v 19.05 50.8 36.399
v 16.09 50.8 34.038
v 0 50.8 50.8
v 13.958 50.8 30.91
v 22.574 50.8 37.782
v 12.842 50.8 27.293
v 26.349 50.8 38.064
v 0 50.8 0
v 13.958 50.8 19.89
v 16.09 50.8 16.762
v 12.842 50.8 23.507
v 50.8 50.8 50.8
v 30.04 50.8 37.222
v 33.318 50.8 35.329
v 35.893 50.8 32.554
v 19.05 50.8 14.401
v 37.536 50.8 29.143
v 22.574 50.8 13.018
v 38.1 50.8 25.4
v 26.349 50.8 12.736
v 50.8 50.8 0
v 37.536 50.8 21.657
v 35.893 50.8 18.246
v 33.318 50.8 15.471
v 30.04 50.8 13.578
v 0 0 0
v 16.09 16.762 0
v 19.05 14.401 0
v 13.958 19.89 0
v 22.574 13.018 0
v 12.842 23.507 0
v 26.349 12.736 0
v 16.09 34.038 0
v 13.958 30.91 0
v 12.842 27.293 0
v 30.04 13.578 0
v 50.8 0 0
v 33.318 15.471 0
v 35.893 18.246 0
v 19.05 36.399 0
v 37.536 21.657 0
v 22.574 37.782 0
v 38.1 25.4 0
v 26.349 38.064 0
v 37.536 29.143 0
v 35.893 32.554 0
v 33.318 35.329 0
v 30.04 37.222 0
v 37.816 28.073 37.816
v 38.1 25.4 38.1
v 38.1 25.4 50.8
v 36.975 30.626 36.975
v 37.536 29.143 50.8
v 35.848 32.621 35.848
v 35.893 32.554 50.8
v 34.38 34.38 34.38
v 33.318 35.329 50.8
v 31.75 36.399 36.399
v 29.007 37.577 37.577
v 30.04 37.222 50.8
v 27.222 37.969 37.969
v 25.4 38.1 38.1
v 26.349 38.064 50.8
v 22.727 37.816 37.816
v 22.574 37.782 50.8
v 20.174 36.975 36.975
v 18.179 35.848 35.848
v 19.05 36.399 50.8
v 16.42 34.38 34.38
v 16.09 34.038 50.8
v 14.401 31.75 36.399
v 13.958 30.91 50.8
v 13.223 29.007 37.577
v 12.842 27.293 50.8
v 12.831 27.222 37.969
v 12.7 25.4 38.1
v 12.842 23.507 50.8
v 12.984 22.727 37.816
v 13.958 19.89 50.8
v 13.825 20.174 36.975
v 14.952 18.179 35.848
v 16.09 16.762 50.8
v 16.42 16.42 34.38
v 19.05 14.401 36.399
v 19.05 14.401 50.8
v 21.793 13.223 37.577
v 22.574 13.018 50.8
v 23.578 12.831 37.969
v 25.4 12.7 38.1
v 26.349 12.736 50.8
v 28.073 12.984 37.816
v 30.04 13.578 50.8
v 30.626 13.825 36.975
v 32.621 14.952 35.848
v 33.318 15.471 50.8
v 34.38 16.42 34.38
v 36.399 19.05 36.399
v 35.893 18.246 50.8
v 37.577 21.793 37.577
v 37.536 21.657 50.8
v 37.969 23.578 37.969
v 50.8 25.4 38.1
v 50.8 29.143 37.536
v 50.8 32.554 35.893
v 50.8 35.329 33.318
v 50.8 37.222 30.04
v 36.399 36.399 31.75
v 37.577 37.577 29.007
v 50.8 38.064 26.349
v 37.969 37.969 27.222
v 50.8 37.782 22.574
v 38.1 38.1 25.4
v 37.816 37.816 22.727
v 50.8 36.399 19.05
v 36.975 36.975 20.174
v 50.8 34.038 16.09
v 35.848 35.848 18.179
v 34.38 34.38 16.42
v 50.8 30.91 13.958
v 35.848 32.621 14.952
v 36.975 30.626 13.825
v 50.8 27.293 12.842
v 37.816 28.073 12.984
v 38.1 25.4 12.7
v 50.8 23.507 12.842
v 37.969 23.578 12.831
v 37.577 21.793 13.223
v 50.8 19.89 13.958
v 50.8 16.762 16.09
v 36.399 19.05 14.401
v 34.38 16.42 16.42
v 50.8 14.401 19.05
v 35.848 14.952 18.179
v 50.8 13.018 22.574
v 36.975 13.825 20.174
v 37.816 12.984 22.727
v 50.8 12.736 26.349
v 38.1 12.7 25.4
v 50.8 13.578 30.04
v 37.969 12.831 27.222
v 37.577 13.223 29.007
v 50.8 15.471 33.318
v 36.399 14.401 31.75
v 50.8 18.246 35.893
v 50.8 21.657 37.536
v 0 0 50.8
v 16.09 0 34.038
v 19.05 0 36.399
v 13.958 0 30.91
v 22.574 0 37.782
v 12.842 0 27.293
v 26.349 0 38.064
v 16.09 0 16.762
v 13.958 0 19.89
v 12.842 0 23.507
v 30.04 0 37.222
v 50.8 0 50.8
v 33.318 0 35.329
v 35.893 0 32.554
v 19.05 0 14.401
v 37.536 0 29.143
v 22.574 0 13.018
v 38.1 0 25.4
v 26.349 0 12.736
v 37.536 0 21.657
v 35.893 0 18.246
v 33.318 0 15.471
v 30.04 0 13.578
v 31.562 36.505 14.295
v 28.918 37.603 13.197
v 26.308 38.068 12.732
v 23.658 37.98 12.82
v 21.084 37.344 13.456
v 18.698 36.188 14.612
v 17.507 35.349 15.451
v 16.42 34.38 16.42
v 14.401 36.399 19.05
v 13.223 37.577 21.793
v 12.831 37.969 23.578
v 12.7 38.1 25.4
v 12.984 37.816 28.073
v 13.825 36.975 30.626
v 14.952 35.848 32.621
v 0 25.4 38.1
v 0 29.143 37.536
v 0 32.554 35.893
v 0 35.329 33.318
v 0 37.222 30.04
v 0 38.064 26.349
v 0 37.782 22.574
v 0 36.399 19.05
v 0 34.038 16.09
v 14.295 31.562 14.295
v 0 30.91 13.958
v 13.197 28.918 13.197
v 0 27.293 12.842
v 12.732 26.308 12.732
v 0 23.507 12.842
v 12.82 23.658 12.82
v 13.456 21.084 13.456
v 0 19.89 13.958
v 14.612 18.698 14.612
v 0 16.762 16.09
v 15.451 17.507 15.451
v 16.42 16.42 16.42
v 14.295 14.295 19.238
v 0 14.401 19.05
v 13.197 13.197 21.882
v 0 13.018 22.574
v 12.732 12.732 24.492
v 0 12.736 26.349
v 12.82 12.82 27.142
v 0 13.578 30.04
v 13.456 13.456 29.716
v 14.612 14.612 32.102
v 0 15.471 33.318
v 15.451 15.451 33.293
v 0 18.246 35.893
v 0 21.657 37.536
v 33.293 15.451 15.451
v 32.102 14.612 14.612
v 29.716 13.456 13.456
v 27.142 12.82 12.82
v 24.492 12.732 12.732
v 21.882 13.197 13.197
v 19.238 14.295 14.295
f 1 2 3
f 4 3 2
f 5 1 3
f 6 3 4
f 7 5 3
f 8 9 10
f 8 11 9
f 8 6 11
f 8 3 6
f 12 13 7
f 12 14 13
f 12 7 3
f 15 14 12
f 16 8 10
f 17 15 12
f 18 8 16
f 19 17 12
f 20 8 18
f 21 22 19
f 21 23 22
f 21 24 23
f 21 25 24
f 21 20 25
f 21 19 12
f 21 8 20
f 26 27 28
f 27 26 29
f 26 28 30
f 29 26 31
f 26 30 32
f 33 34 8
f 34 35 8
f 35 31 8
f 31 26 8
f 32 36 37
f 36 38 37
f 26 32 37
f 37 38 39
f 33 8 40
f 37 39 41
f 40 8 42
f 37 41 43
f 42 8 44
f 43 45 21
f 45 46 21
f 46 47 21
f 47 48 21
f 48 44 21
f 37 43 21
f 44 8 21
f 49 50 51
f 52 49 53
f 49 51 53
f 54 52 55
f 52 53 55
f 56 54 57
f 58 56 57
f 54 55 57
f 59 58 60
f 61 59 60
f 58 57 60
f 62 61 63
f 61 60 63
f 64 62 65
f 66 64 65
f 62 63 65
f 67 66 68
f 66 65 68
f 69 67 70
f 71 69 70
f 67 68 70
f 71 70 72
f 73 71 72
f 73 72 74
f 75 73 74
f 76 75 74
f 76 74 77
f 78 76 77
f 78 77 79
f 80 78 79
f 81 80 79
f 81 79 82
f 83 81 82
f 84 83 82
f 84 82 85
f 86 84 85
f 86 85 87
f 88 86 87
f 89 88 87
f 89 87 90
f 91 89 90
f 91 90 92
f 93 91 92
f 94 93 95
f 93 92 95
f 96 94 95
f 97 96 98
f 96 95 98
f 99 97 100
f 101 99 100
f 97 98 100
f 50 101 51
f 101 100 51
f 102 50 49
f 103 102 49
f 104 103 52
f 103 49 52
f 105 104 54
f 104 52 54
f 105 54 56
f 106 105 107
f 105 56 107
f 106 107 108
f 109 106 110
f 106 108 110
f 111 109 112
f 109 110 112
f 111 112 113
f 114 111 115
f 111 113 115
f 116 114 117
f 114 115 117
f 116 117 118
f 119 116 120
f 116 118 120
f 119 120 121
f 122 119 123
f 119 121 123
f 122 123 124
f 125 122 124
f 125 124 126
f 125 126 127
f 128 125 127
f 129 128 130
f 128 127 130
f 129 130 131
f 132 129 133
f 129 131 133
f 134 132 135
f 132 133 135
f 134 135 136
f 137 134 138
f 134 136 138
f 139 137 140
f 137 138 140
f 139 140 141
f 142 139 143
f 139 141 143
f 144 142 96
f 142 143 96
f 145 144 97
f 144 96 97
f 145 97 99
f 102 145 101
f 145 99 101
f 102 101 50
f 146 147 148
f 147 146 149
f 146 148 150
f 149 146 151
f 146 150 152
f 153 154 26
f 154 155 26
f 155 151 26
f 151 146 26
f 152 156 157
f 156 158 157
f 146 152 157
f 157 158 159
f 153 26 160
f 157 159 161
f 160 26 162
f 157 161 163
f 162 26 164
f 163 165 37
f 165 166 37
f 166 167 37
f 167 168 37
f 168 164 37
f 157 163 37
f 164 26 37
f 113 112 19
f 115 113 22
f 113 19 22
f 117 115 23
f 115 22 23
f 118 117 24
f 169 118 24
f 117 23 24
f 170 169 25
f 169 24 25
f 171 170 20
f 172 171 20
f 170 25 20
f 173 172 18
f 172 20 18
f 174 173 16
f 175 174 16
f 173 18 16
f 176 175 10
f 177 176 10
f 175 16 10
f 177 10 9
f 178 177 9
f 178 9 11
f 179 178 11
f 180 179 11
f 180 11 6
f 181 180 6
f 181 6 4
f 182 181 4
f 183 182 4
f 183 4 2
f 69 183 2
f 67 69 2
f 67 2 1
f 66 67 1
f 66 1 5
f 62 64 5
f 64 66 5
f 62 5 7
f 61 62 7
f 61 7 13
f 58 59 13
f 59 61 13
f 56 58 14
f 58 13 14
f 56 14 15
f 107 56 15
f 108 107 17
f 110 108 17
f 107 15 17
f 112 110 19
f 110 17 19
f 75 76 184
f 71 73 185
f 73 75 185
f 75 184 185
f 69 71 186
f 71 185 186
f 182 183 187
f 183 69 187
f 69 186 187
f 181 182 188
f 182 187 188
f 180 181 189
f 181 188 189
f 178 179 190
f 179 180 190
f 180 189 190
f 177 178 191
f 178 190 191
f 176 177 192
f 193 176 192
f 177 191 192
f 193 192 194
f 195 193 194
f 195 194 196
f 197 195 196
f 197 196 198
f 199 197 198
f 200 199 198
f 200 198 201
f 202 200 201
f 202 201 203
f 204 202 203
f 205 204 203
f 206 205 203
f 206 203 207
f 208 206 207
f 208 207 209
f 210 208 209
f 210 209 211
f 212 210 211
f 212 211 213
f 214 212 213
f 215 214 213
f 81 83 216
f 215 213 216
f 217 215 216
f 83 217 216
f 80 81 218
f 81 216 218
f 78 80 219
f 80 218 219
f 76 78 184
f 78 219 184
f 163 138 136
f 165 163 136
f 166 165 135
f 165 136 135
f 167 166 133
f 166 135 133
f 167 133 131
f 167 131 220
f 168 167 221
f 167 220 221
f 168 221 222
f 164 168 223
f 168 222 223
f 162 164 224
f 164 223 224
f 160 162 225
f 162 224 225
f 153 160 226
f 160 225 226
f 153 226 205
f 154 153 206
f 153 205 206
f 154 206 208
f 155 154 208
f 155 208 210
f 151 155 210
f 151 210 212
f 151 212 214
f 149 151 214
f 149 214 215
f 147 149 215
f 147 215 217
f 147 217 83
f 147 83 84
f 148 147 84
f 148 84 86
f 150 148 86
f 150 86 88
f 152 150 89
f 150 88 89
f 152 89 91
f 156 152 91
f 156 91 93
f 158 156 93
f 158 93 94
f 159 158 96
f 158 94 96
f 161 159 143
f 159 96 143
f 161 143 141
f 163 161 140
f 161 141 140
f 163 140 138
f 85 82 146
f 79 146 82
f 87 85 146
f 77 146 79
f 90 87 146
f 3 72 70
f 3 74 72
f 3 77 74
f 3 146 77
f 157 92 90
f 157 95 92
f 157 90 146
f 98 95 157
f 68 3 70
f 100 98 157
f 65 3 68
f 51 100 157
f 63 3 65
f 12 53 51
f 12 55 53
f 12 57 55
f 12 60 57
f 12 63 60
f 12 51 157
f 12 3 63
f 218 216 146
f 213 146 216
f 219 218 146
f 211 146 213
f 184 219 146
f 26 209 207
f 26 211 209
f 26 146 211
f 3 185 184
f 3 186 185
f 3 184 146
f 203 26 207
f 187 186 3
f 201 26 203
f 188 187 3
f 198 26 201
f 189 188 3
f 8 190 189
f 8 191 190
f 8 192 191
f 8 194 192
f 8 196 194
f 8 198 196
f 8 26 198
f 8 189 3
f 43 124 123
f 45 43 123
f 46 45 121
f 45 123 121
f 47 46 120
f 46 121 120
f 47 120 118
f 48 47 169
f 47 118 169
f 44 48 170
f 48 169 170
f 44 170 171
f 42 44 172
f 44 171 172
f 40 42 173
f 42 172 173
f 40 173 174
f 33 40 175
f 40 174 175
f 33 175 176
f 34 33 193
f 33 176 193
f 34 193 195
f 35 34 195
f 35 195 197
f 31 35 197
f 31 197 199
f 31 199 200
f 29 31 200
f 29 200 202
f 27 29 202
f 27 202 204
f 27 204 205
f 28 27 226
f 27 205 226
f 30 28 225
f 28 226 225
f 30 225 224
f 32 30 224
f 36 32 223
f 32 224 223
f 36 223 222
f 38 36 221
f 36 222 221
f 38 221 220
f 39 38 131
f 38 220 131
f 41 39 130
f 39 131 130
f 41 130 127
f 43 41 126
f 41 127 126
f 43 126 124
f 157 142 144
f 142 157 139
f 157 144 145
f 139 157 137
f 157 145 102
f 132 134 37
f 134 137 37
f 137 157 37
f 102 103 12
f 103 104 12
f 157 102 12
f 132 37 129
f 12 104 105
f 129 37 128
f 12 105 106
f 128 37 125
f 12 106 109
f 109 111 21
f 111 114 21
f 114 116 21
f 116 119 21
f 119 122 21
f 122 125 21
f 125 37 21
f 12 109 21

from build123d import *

# Parameters (mm, degrees)
SKETCH1_W           = 50.8
SKETCH1_H           = 50.8
BOSS_EXTRUDE1_DEPTH = 50.8
SKETCH2_R           = 12.7
CUT_EXTRUDE1_DEPTH  = 50.8
SKETCH3_R           = 12.7
CUT_EXTRUDE2_DEPTH  = 50.8
SKETCH4_R           = 12.7
CUT_EXTRUDE3_DEPTH  = 50.8


with BuildPart() as part:
    # Sketch1 → Boss-Extrude1 (new body)
    with BuildSketch(Plane.XY):
        with Locations((25.4, 25.4)):
            Rectangle(SKETCH1_W, SKETCH1_H)
    extrude(amount=BOSS_EXTRUDE1_DEPTH)

    # Sketch2 → Cut-Extrude1 (cut)
    with BuildSketch(Plane.XY.offset(50.8)):
        with Locations((25.4, 25.4)):
            Circle(SKETCH2_R)
    extrude(amount=-CUT_EXTRUDE1_DEPTH, mode=Mode.SUBTRACT)

    # Sketch3 → Cut-Extrude2 (cut)
    with BuildSketch(Plane(origin=(0, 50.8, 0), x_dir=(1, 0, 0), z_dir=(0, 1, 0))):
        with Locations((25.4, -25.4)):
            Circle(SKETCH3_R)
    extrude(amount=-CUT_EXTRUDE2_DEPTH, mode=Mode.SUBTRACT)

    # Sketch4 → Cut-Extrude3 (cut)
    with BuildSketch(Plane.ZY):
        with Locations((25.4, 25.4)):
            Circle(SKETCH4_R)
    extrude(amount=-CUT_EXTRUDE3_DEPTH, mode=Mode.SUBTRACT)


solid = part.part
